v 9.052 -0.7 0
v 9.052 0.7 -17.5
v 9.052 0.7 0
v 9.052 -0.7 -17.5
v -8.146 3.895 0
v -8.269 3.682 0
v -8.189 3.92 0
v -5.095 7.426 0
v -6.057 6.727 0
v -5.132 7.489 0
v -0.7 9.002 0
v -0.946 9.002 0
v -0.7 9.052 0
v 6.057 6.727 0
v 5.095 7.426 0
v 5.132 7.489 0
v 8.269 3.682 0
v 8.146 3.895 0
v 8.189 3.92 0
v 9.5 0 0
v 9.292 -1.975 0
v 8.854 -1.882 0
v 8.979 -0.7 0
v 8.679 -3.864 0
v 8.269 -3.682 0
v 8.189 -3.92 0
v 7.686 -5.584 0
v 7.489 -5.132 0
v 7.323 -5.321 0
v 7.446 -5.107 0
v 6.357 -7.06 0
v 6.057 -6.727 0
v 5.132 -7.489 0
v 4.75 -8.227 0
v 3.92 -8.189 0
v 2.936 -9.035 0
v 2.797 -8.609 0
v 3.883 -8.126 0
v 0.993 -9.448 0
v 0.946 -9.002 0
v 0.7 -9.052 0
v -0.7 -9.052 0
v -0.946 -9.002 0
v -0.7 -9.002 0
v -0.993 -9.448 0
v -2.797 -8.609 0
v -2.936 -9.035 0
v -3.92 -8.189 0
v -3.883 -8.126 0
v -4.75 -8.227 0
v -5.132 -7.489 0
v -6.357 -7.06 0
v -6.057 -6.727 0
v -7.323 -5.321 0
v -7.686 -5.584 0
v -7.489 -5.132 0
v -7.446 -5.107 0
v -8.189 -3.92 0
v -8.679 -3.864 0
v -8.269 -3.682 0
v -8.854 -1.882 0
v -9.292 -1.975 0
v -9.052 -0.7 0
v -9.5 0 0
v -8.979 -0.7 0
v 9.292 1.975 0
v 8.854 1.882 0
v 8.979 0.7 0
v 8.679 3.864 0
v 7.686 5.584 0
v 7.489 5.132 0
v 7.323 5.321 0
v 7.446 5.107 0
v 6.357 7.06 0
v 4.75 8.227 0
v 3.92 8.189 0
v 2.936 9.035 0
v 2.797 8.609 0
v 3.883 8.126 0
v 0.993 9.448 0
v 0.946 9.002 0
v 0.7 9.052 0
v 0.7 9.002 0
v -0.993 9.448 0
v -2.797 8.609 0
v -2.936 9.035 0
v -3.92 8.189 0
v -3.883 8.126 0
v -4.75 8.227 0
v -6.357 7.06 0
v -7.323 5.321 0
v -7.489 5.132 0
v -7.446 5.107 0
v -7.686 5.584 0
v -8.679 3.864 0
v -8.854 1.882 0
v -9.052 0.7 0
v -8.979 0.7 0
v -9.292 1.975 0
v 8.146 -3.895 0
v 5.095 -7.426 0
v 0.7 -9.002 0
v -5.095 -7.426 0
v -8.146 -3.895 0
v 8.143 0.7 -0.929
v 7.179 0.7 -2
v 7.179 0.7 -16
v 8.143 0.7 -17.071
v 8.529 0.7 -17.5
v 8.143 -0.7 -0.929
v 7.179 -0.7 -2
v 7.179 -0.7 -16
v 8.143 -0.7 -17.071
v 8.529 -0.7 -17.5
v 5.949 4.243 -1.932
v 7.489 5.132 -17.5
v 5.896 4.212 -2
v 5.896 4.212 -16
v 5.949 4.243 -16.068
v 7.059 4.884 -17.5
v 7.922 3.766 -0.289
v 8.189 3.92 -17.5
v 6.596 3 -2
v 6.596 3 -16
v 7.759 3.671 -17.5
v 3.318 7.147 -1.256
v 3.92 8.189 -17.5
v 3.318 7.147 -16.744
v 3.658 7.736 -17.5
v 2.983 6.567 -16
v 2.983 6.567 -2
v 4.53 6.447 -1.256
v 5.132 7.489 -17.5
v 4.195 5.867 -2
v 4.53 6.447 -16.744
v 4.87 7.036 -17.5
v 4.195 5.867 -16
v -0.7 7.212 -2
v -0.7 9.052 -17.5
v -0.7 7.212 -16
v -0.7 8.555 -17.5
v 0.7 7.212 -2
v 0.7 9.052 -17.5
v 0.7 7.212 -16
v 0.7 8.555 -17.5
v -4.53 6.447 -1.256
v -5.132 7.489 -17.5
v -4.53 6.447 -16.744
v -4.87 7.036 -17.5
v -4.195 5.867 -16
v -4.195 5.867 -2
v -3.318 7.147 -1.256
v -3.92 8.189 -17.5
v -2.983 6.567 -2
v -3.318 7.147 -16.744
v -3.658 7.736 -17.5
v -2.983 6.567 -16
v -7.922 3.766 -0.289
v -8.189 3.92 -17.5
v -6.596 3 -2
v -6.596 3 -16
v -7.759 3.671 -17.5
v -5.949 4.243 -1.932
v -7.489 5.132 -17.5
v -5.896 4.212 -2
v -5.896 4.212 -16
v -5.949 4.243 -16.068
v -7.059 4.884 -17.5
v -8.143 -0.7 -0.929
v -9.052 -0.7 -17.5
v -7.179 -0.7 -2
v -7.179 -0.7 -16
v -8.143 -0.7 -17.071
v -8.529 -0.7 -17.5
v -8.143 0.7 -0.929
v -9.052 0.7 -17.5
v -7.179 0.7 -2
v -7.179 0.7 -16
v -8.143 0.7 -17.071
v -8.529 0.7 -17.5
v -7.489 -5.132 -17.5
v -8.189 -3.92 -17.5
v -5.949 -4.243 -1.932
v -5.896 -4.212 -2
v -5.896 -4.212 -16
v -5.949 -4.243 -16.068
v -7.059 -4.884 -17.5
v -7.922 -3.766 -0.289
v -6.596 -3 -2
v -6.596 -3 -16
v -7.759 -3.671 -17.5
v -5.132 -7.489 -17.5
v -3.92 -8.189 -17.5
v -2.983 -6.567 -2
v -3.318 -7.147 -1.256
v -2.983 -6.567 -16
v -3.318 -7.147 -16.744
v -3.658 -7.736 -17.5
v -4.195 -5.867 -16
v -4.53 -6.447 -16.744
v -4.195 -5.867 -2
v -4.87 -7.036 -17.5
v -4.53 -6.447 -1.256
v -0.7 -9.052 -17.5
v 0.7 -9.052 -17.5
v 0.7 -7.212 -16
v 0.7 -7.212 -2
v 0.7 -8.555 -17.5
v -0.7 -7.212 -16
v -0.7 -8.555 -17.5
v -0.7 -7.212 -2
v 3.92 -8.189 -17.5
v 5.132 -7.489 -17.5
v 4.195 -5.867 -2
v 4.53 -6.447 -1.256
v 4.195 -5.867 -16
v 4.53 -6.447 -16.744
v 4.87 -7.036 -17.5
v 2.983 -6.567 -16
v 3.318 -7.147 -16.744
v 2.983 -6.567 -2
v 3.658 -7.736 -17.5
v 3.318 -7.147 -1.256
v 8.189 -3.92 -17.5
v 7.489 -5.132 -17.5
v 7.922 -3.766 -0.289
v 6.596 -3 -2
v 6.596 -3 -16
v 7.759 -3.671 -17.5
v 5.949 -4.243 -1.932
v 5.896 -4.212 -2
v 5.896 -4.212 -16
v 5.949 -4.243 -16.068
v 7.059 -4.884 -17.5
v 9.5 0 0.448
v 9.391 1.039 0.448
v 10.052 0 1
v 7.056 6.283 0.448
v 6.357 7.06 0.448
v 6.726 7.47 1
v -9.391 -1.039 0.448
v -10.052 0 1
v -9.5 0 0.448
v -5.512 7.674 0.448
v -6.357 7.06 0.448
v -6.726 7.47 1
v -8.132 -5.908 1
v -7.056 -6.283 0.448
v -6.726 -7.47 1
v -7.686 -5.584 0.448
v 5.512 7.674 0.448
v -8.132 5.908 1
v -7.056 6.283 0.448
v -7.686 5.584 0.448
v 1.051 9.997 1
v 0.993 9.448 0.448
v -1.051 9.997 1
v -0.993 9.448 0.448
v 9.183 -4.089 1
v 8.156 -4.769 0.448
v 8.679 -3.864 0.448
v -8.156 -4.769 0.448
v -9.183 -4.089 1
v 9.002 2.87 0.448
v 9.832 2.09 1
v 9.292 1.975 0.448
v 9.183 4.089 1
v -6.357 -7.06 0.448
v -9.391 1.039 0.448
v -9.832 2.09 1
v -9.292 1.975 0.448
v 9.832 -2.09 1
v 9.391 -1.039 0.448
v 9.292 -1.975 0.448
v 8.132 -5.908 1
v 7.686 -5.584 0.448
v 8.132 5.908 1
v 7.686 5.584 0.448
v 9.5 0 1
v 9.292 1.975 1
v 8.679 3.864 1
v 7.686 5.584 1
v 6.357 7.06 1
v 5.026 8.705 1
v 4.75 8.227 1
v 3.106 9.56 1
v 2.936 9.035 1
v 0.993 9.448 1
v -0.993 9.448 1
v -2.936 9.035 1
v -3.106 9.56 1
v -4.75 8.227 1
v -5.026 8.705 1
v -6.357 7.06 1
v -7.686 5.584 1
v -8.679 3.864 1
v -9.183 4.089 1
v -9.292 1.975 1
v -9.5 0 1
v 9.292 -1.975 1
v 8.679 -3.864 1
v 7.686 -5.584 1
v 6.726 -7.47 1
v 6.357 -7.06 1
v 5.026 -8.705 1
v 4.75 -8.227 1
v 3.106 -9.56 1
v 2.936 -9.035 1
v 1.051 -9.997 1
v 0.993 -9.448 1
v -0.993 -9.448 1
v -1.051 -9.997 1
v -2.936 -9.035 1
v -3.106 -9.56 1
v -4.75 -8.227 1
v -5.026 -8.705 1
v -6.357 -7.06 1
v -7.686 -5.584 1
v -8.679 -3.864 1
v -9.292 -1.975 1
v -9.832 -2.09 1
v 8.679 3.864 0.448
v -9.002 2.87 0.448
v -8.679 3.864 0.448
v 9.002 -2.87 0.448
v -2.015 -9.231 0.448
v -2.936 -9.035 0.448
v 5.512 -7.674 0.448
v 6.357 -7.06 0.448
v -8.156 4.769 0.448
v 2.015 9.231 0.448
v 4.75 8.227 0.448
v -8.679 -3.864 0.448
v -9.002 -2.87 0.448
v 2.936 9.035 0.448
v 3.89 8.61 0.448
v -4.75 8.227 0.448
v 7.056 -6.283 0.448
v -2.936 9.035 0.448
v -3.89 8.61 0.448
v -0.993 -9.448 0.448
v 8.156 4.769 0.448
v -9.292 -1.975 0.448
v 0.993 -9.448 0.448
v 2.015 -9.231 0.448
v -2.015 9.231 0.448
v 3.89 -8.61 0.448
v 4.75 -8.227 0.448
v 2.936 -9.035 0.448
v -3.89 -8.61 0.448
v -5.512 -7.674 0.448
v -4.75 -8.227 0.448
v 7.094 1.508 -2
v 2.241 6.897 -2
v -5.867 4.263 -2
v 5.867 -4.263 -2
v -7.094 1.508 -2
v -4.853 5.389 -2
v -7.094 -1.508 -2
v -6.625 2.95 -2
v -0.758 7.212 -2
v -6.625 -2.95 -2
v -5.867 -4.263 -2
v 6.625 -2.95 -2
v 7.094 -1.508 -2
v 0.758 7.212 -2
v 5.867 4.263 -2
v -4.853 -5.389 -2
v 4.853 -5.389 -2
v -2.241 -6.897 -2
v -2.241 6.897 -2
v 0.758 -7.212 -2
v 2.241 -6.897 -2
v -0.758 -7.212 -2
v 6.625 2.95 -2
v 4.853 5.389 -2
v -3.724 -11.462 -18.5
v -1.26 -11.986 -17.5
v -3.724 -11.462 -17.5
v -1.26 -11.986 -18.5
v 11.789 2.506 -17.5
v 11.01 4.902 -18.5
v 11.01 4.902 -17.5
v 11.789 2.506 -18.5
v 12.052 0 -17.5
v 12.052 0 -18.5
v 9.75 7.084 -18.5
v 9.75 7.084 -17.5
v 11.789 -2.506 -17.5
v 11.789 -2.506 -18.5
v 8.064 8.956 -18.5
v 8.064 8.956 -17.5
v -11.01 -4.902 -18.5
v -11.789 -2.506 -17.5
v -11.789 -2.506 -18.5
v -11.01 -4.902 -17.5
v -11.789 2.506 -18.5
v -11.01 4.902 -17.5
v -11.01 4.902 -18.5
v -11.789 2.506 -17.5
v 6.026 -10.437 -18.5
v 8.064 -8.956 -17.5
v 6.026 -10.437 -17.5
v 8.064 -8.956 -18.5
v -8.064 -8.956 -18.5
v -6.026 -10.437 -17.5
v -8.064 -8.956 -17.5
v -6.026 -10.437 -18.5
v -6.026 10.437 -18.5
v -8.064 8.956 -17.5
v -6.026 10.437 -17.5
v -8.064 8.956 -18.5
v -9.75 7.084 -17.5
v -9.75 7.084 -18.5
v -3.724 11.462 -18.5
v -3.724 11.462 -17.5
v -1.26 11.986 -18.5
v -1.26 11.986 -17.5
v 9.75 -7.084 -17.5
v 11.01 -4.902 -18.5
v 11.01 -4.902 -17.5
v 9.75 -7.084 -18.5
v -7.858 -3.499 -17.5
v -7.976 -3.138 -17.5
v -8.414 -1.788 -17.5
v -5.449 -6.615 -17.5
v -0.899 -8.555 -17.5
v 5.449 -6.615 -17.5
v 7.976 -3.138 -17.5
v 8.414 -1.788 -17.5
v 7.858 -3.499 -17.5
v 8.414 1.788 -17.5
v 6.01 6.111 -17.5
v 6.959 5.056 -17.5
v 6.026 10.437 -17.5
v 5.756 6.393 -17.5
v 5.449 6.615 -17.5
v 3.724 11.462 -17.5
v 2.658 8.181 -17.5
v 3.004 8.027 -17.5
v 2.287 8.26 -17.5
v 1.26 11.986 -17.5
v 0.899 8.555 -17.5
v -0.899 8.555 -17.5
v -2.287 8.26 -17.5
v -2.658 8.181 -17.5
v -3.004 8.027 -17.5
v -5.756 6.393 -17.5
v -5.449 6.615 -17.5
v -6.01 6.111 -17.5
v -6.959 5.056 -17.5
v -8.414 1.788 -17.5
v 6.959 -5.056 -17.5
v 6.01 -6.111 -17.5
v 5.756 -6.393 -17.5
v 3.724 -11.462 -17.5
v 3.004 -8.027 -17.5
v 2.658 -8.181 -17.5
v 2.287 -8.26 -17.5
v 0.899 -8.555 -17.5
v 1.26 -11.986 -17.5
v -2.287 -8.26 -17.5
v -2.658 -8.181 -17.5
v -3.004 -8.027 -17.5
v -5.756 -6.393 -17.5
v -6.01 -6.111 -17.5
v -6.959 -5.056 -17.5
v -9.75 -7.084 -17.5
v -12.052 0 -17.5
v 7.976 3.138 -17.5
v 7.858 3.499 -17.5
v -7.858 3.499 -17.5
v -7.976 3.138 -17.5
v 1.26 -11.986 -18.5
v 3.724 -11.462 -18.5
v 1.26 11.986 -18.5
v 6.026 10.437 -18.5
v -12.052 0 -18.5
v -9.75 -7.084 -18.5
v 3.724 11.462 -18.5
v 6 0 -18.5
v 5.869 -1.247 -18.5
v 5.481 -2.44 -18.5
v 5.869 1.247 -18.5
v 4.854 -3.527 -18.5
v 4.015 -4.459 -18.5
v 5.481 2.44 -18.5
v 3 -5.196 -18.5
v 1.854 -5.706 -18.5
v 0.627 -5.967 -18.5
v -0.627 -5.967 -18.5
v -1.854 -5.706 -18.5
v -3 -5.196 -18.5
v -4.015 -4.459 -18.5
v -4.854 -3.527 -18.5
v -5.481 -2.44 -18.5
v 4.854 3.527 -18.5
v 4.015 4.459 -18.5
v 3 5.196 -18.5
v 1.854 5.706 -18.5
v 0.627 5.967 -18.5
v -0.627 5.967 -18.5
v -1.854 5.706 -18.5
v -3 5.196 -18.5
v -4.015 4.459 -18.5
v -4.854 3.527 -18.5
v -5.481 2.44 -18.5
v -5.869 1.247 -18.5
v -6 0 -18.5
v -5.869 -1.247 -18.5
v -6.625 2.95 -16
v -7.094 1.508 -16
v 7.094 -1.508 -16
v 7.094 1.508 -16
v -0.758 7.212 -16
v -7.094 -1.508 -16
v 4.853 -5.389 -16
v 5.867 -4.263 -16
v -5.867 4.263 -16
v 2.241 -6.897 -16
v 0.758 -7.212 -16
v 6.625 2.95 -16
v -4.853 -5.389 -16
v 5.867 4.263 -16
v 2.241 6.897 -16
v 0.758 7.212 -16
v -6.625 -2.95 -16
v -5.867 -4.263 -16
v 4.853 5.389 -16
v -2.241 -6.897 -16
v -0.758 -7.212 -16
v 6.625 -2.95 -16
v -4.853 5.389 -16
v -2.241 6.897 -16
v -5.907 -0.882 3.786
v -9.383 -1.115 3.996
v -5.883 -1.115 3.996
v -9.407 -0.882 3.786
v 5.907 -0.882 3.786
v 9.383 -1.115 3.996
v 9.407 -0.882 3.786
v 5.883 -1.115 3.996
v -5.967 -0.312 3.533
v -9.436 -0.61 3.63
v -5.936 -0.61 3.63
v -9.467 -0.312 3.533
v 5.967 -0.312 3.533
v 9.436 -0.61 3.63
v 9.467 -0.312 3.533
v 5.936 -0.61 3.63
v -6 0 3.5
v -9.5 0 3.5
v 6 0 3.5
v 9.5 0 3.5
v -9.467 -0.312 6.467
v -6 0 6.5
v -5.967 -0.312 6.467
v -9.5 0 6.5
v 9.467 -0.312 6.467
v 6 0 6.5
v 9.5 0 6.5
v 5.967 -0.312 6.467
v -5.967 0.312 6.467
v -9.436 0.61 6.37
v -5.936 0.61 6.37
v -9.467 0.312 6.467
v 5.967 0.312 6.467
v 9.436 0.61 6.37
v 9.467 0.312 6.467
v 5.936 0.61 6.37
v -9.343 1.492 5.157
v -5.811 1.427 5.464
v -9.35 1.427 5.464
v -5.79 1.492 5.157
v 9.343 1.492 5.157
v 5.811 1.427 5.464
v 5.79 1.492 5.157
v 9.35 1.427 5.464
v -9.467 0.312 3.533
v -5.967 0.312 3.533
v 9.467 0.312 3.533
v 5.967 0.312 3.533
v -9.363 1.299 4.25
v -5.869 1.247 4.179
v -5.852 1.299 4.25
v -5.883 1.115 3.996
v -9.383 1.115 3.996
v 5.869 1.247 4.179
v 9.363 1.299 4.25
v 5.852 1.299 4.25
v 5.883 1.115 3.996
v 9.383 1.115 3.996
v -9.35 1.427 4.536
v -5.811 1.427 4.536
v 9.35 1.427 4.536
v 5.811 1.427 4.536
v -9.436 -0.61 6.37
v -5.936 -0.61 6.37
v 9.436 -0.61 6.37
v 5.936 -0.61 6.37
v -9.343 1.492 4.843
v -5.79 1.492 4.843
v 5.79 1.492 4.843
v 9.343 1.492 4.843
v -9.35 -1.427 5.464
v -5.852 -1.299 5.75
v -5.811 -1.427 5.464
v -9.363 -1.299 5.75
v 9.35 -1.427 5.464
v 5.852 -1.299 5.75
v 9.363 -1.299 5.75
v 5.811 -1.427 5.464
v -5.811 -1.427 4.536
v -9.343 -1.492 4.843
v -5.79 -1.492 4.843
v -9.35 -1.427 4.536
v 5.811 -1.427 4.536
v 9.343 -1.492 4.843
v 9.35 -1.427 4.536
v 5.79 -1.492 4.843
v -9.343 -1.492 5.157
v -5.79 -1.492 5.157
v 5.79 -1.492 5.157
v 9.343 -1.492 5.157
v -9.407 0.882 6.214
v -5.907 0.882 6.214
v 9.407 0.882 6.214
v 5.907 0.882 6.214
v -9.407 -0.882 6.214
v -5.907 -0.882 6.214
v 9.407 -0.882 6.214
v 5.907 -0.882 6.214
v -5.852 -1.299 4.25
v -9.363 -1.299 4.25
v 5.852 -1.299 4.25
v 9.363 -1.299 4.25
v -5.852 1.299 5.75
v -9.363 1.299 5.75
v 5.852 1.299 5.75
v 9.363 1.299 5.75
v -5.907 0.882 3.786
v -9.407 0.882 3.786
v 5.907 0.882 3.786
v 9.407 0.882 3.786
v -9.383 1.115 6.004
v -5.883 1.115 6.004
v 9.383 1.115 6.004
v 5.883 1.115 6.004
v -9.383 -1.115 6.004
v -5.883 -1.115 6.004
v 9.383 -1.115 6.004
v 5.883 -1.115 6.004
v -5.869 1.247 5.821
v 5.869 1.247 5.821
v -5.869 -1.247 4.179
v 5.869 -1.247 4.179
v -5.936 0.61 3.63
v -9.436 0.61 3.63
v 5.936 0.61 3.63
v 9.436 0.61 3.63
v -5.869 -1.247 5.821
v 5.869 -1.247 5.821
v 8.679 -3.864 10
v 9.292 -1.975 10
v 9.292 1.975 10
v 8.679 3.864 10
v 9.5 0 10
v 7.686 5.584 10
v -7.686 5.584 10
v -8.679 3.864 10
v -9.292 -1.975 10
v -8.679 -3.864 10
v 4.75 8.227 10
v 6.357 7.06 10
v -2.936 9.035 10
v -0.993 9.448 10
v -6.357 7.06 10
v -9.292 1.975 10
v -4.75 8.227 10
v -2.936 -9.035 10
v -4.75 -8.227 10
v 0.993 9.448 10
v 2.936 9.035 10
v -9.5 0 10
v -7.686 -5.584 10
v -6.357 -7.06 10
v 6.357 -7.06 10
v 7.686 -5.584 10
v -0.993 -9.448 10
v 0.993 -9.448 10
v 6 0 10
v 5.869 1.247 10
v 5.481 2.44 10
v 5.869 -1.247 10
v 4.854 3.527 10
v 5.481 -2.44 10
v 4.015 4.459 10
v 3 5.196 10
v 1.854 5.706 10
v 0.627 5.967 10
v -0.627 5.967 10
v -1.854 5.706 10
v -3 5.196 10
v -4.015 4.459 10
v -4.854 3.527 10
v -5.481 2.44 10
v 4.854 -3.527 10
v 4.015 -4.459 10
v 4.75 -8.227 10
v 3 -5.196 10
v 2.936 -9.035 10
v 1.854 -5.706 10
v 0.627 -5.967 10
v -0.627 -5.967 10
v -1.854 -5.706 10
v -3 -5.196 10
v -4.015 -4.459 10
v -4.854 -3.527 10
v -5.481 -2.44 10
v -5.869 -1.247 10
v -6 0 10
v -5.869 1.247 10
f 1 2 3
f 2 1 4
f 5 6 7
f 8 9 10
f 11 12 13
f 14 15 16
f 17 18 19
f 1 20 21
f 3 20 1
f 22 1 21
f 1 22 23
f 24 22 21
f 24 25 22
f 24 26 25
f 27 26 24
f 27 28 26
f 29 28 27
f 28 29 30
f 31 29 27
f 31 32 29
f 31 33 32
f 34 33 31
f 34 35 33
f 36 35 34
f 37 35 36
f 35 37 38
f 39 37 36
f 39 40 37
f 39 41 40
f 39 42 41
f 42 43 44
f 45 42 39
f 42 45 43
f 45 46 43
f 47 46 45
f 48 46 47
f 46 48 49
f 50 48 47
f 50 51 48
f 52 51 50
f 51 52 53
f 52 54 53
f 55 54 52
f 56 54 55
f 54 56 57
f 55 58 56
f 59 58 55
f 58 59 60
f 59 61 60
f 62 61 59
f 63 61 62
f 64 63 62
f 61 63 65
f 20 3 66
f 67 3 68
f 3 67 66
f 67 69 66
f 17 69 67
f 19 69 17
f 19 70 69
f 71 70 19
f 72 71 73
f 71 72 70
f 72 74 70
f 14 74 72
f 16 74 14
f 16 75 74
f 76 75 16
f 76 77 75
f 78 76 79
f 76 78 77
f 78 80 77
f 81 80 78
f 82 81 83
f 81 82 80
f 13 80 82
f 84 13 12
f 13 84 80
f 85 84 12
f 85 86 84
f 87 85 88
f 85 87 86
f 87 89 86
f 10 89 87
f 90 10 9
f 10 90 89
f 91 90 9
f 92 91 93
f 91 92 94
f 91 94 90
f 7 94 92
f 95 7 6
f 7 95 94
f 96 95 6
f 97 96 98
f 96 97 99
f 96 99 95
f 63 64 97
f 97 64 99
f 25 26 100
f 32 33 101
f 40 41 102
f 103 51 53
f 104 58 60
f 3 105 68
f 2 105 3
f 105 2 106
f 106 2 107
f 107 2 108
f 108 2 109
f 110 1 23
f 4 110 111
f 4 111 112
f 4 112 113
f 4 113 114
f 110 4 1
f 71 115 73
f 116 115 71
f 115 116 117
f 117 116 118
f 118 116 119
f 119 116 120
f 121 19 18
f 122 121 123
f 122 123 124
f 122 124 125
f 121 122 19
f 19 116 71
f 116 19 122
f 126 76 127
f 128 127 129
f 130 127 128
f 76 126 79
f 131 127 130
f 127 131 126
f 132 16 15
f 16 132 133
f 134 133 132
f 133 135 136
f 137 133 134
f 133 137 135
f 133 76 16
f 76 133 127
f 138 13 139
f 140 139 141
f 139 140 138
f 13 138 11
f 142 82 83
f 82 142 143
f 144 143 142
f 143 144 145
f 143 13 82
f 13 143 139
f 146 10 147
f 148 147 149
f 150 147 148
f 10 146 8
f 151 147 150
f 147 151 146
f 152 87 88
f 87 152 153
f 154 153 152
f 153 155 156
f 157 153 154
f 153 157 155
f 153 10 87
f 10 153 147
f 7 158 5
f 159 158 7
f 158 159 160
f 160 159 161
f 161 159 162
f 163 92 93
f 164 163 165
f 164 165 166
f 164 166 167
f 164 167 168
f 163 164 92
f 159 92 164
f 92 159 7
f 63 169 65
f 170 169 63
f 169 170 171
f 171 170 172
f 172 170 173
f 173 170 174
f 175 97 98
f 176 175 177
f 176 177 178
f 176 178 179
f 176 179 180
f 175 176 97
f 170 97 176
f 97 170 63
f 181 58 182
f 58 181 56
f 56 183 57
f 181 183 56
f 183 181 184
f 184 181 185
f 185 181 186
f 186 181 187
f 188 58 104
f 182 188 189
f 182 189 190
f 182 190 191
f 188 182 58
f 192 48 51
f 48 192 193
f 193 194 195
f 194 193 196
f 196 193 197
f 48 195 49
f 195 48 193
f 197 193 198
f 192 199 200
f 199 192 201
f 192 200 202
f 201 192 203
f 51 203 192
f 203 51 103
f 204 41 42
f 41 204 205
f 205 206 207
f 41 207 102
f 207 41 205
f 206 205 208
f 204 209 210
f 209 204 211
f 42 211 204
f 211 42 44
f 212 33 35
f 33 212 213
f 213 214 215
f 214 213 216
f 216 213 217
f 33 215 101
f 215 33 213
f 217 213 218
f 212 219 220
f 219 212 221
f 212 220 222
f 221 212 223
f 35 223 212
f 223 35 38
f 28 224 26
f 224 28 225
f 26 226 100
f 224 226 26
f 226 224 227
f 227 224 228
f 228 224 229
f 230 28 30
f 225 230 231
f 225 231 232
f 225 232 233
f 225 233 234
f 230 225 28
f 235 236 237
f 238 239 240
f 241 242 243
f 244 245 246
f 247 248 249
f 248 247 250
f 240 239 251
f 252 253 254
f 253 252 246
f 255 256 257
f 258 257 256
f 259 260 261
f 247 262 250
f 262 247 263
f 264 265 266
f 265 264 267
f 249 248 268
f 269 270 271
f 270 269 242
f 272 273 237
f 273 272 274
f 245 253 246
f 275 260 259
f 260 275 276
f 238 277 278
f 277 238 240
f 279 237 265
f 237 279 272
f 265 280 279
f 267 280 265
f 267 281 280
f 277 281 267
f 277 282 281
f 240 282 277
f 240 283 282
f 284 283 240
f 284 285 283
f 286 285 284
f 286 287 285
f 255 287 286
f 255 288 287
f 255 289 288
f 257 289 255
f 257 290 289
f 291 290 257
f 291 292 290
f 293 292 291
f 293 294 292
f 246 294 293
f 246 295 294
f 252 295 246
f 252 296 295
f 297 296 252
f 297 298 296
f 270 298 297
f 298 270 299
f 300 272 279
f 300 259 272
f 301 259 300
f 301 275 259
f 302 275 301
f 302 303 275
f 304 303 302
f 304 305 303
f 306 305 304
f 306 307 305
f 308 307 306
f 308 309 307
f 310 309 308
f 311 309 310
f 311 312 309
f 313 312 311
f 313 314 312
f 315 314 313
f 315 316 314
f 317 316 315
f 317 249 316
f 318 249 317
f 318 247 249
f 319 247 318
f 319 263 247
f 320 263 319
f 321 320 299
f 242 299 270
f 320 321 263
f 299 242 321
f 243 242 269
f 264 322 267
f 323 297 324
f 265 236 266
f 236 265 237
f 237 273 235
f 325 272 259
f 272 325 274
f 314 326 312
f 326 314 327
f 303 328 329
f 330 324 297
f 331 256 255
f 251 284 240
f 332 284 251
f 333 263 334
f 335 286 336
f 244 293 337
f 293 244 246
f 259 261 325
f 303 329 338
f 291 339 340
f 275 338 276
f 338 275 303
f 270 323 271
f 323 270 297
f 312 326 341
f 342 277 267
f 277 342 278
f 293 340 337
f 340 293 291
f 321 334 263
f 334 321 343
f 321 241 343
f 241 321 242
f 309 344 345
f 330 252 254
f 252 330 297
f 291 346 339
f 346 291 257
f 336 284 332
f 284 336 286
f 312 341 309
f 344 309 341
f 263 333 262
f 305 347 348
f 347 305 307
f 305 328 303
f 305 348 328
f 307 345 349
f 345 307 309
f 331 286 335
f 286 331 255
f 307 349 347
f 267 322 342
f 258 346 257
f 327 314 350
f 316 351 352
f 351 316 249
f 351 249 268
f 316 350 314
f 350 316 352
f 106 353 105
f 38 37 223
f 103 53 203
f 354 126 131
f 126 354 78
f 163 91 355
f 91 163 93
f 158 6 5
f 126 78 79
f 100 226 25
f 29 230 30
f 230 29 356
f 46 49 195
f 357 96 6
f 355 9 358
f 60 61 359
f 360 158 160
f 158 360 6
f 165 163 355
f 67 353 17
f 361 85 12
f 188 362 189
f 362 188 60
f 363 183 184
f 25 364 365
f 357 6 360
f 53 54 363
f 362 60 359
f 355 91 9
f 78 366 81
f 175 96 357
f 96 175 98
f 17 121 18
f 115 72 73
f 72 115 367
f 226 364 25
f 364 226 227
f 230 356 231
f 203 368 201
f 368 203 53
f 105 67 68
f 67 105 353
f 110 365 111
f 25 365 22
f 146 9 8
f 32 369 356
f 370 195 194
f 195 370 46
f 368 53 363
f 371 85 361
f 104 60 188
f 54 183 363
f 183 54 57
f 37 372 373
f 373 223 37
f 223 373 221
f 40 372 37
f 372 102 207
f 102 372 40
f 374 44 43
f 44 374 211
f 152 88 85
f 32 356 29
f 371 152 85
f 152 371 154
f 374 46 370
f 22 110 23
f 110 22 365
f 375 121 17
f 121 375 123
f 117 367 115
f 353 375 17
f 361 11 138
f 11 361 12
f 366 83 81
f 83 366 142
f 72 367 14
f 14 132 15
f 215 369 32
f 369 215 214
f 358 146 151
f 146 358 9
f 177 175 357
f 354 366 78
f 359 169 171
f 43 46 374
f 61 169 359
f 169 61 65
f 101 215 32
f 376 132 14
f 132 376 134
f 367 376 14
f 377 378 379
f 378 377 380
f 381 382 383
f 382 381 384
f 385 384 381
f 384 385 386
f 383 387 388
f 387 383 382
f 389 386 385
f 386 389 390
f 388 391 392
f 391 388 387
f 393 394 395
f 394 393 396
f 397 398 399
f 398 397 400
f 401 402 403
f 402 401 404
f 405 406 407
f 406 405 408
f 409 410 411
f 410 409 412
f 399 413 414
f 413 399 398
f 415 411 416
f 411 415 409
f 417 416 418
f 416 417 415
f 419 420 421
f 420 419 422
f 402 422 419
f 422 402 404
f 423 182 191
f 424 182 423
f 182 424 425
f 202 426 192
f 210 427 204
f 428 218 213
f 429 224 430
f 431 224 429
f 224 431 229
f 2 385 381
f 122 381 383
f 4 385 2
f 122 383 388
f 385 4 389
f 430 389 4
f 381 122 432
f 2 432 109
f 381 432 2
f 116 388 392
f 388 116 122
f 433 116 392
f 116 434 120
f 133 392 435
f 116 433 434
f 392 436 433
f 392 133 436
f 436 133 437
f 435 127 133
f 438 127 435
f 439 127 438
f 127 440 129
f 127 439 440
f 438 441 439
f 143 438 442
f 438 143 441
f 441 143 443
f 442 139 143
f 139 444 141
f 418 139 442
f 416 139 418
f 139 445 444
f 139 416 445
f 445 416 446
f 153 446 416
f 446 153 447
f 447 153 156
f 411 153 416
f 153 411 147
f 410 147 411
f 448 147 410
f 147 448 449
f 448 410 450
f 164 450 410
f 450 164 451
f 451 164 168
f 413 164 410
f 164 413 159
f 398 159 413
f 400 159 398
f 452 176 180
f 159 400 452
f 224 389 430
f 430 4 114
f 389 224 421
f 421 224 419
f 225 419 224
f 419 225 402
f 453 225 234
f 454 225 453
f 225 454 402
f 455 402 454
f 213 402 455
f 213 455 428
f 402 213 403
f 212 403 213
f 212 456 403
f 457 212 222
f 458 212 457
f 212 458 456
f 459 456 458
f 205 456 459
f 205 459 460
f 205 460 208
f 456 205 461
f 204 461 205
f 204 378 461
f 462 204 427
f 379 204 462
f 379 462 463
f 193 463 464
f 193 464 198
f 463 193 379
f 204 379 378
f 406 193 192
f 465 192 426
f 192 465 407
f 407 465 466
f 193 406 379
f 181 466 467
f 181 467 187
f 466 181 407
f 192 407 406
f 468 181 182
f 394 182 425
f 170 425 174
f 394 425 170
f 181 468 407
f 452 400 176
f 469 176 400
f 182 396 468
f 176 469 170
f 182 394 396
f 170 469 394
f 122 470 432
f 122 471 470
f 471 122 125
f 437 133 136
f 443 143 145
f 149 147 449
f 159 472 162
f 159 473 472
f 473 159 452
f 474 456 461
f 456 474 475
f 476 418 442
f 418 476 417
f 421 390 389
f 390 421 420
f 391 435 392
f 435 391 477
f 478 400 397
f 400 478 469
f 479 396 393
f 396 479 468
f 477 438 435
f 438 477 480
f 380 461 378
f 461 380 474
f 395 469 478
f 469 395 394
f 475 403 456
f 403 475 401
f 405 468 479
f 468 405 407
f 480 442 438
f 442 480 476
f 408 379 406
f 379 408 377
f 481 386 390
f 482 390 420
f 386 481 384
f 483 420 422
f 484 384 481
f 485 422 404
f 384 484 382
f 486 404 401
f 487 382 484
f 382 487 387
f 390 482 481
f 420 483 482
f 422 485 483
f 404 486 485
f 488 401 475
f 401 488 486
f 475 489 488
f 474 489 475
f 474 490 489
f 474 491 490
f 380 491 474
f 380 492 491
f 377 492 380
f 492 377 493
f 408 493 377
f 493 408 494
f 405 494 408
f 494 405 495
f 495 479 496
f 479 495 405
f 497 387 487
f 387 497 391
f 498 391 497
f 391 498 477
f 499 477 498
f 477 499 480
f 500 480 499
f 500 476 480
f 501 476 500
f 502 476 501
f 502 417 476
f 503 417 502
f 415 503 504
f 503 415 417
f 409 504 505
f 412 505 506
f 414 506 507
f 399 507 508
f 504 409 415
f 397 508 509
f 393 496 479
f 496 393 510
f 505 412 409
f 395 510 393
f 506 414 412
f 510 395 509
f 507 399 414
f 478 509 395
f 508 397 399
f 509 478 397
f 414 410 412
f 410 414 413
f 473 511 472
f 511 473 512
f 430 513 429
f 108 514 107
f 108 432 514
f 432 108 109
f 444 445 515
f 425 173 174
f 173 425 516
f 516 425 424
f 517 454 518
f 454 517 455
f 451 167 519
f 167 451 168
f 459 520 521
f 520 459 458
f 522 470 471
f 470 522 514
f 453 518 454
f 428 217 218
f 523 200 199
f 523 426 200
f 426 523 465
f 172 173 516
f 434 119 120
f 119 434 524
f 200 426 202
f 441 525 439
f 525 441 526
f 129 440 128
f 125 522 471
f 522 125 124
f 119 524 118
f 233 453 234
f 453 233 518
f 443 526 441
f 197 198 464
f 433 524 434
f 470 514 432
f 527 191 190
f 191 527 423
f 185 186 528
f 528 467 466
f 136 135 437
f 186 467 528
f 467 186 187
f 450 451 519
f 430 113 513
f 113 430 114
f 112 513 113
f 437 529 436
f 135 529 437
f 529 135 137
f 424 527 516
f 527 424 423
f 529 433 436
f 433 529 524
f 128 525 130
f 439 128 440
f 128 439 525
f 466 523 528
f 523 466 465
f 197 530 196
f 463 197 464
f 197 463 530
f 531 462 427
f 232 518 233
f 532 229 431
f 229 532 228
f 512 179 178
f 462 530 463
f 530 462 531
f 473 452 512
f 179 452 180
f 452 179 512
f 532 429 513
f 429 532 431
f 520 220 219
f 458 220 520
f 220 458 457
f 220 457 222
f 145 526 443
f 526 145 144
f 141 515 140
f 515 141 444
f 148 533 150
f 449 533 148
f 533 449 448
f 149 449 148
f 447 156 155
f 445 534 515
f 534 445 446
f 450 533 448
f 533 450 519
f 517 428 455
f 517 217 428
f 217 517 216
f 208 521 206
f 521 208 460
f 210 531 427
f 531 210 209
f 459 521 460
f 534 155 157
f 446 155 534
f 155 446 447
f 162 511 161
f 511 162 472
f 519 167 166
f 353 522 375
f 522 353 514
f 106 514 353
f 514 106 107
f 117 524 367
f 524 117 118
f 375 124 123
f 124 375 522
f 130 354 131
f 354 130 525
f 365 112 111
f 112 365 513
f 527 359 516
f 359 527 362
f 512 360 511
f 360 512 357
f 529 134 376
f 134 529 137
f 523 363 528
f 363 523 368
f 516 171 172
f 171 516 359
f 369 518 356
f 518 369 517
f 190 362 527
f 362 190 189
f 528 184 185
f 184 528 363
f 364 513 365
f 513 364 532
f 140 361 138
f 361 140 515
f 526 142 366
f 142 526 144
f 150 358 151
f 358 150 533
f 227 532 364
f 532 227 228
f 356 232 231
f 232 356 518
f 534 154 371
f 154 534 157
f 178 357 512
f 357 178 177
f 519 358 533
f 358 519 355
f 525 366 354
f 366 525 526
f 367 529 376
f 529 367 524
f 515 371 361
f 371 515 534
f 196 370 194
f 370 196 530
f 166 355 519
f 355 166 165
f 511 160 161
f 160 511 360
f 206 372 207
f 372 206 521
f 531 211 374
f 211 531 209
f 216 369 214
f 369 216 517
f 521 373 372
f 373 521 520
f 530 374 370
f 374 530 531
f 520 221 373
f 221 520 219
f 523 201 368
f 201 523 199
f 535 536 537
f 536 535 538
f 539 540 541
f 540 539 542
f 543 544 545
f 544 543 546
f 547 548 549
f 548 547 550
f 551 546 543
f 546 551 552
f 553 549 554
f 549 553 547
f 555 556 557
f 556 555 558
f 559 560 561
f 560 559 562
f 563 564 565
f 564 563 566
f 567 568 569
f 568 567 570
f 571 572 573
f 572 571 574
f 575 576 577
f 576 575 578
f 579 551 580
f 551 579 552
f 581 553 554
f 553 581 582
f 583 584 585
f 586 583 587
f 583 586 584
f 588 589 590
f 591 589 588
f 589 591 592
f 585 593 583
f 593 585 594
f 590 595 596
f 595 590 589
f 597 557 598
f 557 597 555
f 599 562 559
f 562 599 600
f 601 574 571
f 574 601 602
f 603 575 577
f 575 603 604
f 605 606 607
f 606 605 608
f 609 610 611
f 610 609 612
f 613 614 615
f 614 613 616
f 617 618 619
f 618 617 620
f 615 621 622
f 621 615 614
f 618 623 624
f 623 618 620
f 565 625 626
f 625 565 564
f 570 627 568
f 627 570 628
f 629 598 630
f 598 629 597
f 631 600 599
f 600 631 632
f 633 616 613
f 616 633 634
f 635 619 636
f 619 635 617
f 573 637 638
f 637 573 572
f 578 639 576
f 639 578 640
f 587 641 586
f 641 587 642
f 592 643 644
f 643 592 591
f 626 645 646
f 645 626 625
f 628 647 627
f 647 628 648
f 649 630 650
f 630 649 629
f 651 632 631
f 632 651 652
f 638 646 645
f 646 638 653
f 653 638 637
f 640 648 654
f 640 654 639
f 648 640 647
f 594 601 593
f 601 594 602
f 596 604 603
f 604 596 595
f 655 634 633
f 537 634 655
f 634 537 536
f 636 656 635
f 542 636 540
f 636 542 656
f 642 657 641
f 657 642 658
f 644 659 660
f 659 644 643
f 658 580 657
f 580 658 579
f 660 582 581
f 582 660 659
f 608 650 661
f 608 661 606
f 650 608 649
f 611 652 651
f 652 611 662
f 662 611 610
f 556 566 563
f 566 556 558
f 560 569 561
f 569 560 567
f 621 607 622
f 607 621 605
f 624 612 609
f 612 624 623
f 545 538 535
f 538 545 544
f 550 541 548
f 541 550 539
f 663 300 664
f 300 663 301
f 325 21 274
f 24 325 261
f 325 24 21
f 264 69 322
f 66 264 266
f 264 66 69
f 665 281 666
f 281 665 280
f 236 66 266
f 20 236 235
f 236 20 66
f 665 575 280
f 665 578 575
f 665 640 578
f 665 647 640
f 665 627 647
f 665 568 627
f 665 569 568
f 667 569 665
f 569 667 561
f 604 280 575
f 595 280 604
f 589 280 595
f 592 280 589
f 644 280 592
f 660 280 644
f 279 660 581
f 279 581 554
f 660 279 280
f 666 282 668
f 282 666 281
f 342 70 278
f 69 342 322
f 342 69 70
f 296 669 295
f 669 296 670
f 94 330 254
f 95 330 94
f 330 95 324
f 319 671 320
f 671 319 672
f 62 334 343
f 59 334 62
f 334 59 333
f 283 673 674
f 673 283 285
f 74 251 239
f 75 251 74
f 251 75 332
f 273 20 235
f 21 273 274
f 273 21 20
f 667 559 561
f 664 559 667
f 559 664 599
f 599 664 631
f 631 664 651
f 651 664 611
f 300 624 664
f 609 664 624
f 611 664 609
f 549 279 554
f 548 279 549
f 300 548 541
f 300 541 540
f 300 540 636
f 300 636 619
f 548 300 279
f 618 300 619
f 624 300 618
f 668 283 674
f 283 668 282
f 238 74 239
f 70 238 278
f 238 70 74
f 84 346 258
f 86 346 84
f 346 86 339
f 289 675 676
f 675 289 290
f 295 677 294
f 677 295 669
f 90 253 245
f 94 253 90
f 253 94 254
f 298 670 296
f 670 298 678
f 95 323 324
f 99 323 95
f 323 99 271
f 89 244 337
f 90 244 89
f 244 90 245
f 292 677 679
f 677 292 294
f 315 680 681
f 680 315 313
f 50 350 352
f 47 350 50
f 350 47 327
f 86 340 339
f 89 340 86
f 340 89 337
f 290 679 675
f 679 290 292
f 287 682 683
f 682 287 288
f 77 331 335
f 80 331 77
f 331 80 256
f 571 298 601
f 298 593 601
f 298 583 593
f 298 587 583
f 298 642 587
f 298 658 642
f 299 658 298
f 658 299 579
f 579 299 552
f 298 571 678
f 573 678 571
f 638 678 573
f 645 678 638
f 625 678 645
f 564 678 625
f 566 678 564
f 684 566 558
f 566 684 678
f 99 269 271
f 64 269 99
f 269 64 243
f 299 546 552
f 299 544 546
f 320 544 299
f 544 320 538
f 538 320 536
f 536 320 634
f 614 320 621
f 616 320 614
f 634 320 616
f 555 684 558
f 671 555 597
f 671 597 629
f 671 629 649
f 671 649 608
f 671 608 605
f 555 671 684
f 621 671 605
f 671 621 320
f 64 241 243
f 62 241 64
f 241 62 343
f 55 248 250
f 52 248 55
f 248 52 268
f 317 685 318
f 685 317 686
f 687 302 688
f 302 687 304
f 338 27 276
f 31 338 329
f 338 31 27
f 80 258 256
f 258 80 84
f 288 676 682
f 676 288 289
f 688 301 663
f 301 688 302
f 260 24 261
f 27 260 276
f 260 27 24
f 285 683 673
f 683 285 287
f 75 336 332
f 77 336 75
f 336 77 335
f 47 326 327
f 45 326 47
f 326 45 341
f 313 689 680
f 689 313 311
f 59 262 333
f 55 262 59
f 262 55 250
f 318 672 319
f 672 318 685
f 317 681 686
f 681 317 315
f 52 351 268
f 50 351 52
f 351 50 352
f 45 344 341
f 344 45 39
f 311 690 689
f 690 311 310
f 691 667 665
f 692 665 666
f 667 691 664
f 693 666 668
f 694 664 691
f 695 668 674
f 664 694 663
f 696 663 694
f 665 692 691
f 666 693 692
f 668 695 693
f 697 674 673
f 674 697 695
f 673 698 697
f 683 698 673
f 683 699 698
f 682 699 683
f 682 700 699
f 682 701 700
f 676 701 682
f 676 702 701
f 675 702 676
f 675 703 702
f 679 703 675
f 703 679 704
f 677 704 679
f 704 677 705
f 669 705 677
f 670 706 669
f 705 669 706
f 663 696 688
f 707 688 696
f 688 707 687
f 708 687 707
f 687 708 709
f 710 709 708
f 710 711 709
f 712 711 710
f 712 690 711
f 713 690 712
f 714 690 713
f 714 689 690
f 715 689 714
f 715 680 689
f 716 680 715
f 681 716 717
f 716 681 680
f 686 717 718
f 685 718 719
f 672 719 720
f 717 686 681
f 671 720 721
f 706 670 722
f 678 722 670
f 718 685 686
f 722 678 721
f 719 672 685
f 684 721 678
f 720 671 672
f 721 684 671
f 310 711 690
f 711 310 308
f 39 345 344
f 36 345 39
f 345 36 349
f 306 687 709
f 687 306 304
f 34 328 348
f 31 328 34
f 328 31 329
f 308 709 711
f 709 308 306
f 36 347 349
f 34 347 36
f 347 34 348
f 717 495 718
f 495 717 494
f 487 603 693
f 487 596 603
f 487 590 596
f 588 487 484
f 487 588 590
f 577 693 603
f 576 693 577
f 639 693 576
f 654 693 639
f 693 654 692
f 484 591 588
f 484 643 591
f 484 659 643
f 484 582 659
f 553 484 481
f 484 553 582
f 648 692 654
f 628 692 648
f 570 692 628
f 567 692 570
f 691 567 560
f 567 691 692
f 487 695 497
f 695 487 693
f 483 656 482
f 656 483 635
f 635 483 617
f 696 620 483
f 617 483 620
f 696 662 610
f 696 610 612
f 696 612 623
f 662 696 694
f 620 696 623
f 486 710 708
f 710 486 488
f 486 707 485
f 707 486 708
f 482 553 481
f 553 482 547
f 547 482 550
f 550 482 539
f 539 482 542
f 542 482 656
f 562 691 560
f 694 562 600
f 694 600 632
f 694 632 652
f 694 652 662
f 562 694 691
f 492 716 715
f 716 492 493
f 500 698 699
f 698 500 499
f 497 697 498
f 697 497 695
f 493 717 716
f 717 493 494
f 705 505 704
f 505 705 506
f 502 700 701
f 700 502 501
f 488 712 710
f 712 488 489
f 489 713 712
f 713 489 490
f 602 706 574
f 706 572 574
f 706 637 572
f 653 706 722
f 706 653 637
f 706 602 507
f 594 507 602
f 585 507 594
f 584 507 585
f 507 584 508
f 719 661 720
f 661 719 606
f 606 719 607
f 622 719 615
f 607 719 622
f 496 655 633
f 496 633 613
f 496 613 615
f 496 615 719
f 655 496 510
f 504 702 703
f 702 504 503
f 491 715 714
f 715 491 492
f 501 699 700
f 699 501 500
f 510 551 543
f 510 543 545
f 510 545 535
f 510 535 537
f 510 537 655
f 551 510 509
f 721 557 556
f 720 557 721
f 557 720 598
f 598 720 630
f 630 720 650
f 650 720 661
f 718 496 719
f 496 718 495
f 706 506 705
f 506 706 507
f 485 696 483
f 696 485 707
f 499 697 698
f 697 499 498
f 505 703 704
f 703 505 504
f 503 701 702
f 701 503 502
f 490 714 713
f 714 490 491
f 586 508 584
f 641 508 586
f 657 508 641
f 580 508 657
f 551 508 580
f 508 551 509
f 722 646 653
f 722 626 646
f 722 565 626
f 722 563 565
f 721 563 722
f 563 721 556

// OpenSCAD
// By Erik de Bruijn <reprap@erikdebruijn.nl>
// License: GPLv2 or later
// Modified by James Newton <jamesnewton@massmind.org>
// 2012/05/31 Corrected issue with setscrew holes poking all the way through the opposite side of the hub.
// the teardrop height must be half the hubDiameter and then the hole has to be translated out to the shaftDiameter
// Also added hubSetScrewAngle so the setscrew holes can be angled for use of the pully on drill press handels
// where the handles come out at an angle. This allows the drill press to be automated as part of a CNC conversion.
// Minor corrections... Also probably introduced minor errors.
//
// Goal: the goal of this parametric model is to generate a high quality custom timing pulley that is printable without support material.
// NOTE: The diameter of the gear parts are determined by the belt's pitch and number of teeth on a pully.
// updates:
// numSetScrews allows you to specify multiple set screws, 1 or 3 are useful values. With 3 you will be able to center the axis.

// //////////////////////////////
// USER PARAMETERS
// //////////////////////////////

// Pulley properties
shaftDiameter = 12; // the shaft at the center, will be subtracted from the pulley. Better be too small than too wide.
hubDiameter = 19; // if the hub or timing pulley is big enough to fit a nut, this will be embedded.
hubHeight = 10; // the hub is the thick cylinder connected to the pulley to allow a set screw to go through or as a collar for a nut.
flanges = 2; // the rims that keep the belt from going anywhere
hubSetScrewDiameter = 3; // use either a set screw or nut on a shaft. Set to 0 to not use a set screw.
hubSetScrewAngle = 90; //change from 90 to angle the setscrews
numSetScrews = 2;
numTeeth = 12; // this value together with the pitch determines the pulley diameter
toothType = 3; // 1 = slightly rounded, 2 = oval sharp, 3 = square. For square, set the toothWith a little low.

// Belt properties:
pitch = 5.08; // distance between the teeth
beltWidth = 14; // the width/height of the belt. The (vertical) size of the pulley is adapted to this.
beltThickness = 0.65; // thickness of the part excluding the notch depth!
notchDepth = 1.8; // make it slightly bigger than actual, there's an outward curvature in the inner solid part of the pulley
toothWidth = 1.4; // Teeth of the PULLEY, that is.

// //////////////////////////////
// Includes
// //////////////////////////////
include <MCAD/teardrop.scad>
// See the bottom of the script to comment it out if you don't want to use this include!
//

// //////////////////////////////
// OpenSCAD SCRIPT
// //////////////////////////////

PI = 3.14159265;
$fs=1; // def 1, 0.2 is high res
$fa=12;//def 12, 3 is very nice

pulleyDiameter = pitch*numTeeth/PI;

if(hubSetScrewDiameter >= 1) // 
{
	echo("set screw, no nut");
	timingPulley( pitch,beltWidth,beltThickness,notchDepth,numTeeth,flanges, shaftDiameter,hubDiameter,hubHeight,hubSetScrewDiameter);
}

if(hubSetScrewDiameter == 0) // use a nut
{
echo("use a nut");
if(pulleyDiameter >= hubDiameter) // no hub needed
{
	echo("no hub needed");
	difference()
	{
		timingPulley(
			pitch,beltWidth,beltThickness,notchDepth,numTeeth,flanges,shaftDiameter,hubDiameter,0,hubSetScrewDiameter
		);
		translate([0,0,-6]) nut(8,8);
	}
}
if(pulleyDiameter < hubDiameter)
{
	echo("hub is needed");
	difference()
	{
		timingPulley(
			pitch,beltWidth,beltThickness,notchDepth,numTeeth,flanges,shaftDiameter,hubDiameter,hubHeight,hubSetScrewDiameter
		);
		translate([0,0,8]) nut(8,12);
	}
}
}

// also in ~/RepRap/Object Files/nuts.scad
module nut(nutSize,height)
{
// Based on some random measurements:
// M3 = 5.36
// M5 = 7.85
// M8 = 12.87
	hexSize = nutSize + 12.67 - 8; // only checked this for M8 hex nuts!!
	union()
	{
		 for(i=[0:5])
		{
			intersection()
			{
				rotate([0,0,60*i]) translate([0,-hexSize/2,0]) cube([hexSize/2,hexSize,height]);
				rotate([0,0,60*(i+1)]) translate([0,-hexSize/2,0]) cube([hexSize/2,hexSize,height]);
			}
		}
	}
}


module timingPulley(
	pitch, beltWidth, beltThickness, notchDepth, numTeeth, flanges, shaftDiameter, hubDiameter, hubHeight, hubSetScrewDiameter
) {
	totalHeight = beltWidth + flanges*4 + hubHeight;

	difference()
	{
		union()
		{
			timingGear(pitch,beltWidth,beltThickness,numTeeth,notchDepth,flanges);
			hub(hubDiameter,hubHeight,hubSetScrewDiameter);
		}
		shaft(totalHeight*2,shaftDiameter);
	}




	module shaft(shaftHeight, shaftDiameter)
	{
		cylinder(h = shaftHeight, r = shaftDiameter/2, center =true);
	}


	module timingGear(pitch,beltWidth,beltThickness,numTeeth,notchDepth,flanges)
	{
		flangeHeight = 0;
		//if(flanges==1)
		{
			flangeHeight = 2;
		}
		
		toothHeight = beltWidth+flangeHeight*2;
		circumference = numTeeth*pitch;
		outerRadius = circumference/PI/2-beltThickness;
		innerRadius = circumference/PI/2-notchDepth-beltThickness;

		union()
		{
			//solid part of gear
			translate([0,0,-toothHeight]) cylinder(h = toothHeight, r = innerRadius, center =false);
			//teeth part of gear
			translate([0,0,-toothHeight/2]) teeth(pitch,numTeeth,toothWidth,notchDepth,toothHeight);
	
			// flanges:
			if(flanges>=1)
			{
				//top flange
				translate([0,0,0]) cylinder(h = 1, r1=outerRadius,r2=outerRadius+1);
				translate([0,0,-flangeHeight]) cylinder(h = flangeHeight, r2=outerRadius,r1=innerRadius);
				//bottom flange
				translate([0,0,-toothHeight-0.5]) cylinder(h = 1, r=outerRadius+3);
				translate([0,0,-toothHeight]) cylinder(h = flangeHeight, r1=outerRadius,r2=innerRadius);
			}
		}

	}

	module teeth(pitch,numTeeth,toothWidth,notchDepth,toothHeight)
	{
		// teeth are apart by the 'pitch' distance
		// this determines the outer radius of the teeth
		circumference = numTeeth*pitch;
		outerRadius = circumference/PI/2-beltThickness;
		innerRadius = circumference/PI/2-notchDepth-beltThickness;
		echo("Teeth diameter is: ", outerRadius*2);
		echo("Pulley inside of teeth radius is: ", innerRadius*2);
		
		for(i = [0:numTeeth-1])
		{
			rotate([0,0,i*360/numTeeth]) translate([innerRadius,0,0]) 
				tooth(toothWidth,notchDepth, toothHeight,toothType);
		}
	}
	module tooth(toothWidth,notchDepth, toothHeight,toothType)
	{
		if(toothType == 1)
		{
			union()
			{
				translate([notchDepth*0.25,0,0]) 
					cube(size = [notchDepth,toothWidth,toothHeight],center = true);
		  		translate([notchDepth*0.75,0,0]) scale([notchDepth/4, toothWidth/2, 1]) 
					cylinder(h = toothHeight, r = 1, center=true);
			}
		}
		if(toothType == 2)
			scale([notchDepth, toothWidth/2, 1]) cylinder(h = toothHeight, r = 1, center=true);

		if(toothType == 3)
		{
			union()
			{
				#translate([notchDepth*0.5-1,0,0]) cube(size = [notchDepth+2,toothWidth,toothHeight],center = true);
		  		//scale([notchDepth/4, toothWidth/2, 1]) cylinder(h = toothHeight, r = 1, center=true);
			}
		}
	}

	module hub(hubDiameter,hubHeight,hubSetScrewDiameter)
	{
		if(hubSetScrewDiameter == 0)
		{
			cylinder(h = hubHeight, r = hubDiameter/2, center =false);
		}
		if(hubSetScrewDiameter > 0)
		{
			difference()
			{
				
				cylinder(h = hubHeight, r = hubDiameter/2, center =false);
				for(rotZ=[1:numSetScrews])
					rotate([0,0,360*(rotZ/numSetScrews)]) translate([shaftDiameter/1.9,0,hubHeight/2]) rotate([0,hubSetScrewAngle,0]) 
						#teardrop(hubSetScrewDiameter/2, hubDiameter/1.9*2,true);
			}
		}
	}


}


/* include: module teardrop(radius,height,truncated)
module teardrop(radius,height,truncated)
{
	truncateMM = 1;
	union()
	{
		if(truncated == true)
		{
		intersection()
		{
		translate([0,0,height/2]) scale([1,1,height]) rotate([0,0,180]) cube([radius*2.5,radius*2,1],center=true);
		scale([1,1,height]) rotate([0,0,3*45]) cube([radius,radius,1]);
		}
		}
		if(truncated == false)
		{
		scale([1,1,height]) rotate([0,0,3*45]) cube([radius,radius,1]);
		}
		#cylinder(r=radius, h = height);
	}
}
*/
